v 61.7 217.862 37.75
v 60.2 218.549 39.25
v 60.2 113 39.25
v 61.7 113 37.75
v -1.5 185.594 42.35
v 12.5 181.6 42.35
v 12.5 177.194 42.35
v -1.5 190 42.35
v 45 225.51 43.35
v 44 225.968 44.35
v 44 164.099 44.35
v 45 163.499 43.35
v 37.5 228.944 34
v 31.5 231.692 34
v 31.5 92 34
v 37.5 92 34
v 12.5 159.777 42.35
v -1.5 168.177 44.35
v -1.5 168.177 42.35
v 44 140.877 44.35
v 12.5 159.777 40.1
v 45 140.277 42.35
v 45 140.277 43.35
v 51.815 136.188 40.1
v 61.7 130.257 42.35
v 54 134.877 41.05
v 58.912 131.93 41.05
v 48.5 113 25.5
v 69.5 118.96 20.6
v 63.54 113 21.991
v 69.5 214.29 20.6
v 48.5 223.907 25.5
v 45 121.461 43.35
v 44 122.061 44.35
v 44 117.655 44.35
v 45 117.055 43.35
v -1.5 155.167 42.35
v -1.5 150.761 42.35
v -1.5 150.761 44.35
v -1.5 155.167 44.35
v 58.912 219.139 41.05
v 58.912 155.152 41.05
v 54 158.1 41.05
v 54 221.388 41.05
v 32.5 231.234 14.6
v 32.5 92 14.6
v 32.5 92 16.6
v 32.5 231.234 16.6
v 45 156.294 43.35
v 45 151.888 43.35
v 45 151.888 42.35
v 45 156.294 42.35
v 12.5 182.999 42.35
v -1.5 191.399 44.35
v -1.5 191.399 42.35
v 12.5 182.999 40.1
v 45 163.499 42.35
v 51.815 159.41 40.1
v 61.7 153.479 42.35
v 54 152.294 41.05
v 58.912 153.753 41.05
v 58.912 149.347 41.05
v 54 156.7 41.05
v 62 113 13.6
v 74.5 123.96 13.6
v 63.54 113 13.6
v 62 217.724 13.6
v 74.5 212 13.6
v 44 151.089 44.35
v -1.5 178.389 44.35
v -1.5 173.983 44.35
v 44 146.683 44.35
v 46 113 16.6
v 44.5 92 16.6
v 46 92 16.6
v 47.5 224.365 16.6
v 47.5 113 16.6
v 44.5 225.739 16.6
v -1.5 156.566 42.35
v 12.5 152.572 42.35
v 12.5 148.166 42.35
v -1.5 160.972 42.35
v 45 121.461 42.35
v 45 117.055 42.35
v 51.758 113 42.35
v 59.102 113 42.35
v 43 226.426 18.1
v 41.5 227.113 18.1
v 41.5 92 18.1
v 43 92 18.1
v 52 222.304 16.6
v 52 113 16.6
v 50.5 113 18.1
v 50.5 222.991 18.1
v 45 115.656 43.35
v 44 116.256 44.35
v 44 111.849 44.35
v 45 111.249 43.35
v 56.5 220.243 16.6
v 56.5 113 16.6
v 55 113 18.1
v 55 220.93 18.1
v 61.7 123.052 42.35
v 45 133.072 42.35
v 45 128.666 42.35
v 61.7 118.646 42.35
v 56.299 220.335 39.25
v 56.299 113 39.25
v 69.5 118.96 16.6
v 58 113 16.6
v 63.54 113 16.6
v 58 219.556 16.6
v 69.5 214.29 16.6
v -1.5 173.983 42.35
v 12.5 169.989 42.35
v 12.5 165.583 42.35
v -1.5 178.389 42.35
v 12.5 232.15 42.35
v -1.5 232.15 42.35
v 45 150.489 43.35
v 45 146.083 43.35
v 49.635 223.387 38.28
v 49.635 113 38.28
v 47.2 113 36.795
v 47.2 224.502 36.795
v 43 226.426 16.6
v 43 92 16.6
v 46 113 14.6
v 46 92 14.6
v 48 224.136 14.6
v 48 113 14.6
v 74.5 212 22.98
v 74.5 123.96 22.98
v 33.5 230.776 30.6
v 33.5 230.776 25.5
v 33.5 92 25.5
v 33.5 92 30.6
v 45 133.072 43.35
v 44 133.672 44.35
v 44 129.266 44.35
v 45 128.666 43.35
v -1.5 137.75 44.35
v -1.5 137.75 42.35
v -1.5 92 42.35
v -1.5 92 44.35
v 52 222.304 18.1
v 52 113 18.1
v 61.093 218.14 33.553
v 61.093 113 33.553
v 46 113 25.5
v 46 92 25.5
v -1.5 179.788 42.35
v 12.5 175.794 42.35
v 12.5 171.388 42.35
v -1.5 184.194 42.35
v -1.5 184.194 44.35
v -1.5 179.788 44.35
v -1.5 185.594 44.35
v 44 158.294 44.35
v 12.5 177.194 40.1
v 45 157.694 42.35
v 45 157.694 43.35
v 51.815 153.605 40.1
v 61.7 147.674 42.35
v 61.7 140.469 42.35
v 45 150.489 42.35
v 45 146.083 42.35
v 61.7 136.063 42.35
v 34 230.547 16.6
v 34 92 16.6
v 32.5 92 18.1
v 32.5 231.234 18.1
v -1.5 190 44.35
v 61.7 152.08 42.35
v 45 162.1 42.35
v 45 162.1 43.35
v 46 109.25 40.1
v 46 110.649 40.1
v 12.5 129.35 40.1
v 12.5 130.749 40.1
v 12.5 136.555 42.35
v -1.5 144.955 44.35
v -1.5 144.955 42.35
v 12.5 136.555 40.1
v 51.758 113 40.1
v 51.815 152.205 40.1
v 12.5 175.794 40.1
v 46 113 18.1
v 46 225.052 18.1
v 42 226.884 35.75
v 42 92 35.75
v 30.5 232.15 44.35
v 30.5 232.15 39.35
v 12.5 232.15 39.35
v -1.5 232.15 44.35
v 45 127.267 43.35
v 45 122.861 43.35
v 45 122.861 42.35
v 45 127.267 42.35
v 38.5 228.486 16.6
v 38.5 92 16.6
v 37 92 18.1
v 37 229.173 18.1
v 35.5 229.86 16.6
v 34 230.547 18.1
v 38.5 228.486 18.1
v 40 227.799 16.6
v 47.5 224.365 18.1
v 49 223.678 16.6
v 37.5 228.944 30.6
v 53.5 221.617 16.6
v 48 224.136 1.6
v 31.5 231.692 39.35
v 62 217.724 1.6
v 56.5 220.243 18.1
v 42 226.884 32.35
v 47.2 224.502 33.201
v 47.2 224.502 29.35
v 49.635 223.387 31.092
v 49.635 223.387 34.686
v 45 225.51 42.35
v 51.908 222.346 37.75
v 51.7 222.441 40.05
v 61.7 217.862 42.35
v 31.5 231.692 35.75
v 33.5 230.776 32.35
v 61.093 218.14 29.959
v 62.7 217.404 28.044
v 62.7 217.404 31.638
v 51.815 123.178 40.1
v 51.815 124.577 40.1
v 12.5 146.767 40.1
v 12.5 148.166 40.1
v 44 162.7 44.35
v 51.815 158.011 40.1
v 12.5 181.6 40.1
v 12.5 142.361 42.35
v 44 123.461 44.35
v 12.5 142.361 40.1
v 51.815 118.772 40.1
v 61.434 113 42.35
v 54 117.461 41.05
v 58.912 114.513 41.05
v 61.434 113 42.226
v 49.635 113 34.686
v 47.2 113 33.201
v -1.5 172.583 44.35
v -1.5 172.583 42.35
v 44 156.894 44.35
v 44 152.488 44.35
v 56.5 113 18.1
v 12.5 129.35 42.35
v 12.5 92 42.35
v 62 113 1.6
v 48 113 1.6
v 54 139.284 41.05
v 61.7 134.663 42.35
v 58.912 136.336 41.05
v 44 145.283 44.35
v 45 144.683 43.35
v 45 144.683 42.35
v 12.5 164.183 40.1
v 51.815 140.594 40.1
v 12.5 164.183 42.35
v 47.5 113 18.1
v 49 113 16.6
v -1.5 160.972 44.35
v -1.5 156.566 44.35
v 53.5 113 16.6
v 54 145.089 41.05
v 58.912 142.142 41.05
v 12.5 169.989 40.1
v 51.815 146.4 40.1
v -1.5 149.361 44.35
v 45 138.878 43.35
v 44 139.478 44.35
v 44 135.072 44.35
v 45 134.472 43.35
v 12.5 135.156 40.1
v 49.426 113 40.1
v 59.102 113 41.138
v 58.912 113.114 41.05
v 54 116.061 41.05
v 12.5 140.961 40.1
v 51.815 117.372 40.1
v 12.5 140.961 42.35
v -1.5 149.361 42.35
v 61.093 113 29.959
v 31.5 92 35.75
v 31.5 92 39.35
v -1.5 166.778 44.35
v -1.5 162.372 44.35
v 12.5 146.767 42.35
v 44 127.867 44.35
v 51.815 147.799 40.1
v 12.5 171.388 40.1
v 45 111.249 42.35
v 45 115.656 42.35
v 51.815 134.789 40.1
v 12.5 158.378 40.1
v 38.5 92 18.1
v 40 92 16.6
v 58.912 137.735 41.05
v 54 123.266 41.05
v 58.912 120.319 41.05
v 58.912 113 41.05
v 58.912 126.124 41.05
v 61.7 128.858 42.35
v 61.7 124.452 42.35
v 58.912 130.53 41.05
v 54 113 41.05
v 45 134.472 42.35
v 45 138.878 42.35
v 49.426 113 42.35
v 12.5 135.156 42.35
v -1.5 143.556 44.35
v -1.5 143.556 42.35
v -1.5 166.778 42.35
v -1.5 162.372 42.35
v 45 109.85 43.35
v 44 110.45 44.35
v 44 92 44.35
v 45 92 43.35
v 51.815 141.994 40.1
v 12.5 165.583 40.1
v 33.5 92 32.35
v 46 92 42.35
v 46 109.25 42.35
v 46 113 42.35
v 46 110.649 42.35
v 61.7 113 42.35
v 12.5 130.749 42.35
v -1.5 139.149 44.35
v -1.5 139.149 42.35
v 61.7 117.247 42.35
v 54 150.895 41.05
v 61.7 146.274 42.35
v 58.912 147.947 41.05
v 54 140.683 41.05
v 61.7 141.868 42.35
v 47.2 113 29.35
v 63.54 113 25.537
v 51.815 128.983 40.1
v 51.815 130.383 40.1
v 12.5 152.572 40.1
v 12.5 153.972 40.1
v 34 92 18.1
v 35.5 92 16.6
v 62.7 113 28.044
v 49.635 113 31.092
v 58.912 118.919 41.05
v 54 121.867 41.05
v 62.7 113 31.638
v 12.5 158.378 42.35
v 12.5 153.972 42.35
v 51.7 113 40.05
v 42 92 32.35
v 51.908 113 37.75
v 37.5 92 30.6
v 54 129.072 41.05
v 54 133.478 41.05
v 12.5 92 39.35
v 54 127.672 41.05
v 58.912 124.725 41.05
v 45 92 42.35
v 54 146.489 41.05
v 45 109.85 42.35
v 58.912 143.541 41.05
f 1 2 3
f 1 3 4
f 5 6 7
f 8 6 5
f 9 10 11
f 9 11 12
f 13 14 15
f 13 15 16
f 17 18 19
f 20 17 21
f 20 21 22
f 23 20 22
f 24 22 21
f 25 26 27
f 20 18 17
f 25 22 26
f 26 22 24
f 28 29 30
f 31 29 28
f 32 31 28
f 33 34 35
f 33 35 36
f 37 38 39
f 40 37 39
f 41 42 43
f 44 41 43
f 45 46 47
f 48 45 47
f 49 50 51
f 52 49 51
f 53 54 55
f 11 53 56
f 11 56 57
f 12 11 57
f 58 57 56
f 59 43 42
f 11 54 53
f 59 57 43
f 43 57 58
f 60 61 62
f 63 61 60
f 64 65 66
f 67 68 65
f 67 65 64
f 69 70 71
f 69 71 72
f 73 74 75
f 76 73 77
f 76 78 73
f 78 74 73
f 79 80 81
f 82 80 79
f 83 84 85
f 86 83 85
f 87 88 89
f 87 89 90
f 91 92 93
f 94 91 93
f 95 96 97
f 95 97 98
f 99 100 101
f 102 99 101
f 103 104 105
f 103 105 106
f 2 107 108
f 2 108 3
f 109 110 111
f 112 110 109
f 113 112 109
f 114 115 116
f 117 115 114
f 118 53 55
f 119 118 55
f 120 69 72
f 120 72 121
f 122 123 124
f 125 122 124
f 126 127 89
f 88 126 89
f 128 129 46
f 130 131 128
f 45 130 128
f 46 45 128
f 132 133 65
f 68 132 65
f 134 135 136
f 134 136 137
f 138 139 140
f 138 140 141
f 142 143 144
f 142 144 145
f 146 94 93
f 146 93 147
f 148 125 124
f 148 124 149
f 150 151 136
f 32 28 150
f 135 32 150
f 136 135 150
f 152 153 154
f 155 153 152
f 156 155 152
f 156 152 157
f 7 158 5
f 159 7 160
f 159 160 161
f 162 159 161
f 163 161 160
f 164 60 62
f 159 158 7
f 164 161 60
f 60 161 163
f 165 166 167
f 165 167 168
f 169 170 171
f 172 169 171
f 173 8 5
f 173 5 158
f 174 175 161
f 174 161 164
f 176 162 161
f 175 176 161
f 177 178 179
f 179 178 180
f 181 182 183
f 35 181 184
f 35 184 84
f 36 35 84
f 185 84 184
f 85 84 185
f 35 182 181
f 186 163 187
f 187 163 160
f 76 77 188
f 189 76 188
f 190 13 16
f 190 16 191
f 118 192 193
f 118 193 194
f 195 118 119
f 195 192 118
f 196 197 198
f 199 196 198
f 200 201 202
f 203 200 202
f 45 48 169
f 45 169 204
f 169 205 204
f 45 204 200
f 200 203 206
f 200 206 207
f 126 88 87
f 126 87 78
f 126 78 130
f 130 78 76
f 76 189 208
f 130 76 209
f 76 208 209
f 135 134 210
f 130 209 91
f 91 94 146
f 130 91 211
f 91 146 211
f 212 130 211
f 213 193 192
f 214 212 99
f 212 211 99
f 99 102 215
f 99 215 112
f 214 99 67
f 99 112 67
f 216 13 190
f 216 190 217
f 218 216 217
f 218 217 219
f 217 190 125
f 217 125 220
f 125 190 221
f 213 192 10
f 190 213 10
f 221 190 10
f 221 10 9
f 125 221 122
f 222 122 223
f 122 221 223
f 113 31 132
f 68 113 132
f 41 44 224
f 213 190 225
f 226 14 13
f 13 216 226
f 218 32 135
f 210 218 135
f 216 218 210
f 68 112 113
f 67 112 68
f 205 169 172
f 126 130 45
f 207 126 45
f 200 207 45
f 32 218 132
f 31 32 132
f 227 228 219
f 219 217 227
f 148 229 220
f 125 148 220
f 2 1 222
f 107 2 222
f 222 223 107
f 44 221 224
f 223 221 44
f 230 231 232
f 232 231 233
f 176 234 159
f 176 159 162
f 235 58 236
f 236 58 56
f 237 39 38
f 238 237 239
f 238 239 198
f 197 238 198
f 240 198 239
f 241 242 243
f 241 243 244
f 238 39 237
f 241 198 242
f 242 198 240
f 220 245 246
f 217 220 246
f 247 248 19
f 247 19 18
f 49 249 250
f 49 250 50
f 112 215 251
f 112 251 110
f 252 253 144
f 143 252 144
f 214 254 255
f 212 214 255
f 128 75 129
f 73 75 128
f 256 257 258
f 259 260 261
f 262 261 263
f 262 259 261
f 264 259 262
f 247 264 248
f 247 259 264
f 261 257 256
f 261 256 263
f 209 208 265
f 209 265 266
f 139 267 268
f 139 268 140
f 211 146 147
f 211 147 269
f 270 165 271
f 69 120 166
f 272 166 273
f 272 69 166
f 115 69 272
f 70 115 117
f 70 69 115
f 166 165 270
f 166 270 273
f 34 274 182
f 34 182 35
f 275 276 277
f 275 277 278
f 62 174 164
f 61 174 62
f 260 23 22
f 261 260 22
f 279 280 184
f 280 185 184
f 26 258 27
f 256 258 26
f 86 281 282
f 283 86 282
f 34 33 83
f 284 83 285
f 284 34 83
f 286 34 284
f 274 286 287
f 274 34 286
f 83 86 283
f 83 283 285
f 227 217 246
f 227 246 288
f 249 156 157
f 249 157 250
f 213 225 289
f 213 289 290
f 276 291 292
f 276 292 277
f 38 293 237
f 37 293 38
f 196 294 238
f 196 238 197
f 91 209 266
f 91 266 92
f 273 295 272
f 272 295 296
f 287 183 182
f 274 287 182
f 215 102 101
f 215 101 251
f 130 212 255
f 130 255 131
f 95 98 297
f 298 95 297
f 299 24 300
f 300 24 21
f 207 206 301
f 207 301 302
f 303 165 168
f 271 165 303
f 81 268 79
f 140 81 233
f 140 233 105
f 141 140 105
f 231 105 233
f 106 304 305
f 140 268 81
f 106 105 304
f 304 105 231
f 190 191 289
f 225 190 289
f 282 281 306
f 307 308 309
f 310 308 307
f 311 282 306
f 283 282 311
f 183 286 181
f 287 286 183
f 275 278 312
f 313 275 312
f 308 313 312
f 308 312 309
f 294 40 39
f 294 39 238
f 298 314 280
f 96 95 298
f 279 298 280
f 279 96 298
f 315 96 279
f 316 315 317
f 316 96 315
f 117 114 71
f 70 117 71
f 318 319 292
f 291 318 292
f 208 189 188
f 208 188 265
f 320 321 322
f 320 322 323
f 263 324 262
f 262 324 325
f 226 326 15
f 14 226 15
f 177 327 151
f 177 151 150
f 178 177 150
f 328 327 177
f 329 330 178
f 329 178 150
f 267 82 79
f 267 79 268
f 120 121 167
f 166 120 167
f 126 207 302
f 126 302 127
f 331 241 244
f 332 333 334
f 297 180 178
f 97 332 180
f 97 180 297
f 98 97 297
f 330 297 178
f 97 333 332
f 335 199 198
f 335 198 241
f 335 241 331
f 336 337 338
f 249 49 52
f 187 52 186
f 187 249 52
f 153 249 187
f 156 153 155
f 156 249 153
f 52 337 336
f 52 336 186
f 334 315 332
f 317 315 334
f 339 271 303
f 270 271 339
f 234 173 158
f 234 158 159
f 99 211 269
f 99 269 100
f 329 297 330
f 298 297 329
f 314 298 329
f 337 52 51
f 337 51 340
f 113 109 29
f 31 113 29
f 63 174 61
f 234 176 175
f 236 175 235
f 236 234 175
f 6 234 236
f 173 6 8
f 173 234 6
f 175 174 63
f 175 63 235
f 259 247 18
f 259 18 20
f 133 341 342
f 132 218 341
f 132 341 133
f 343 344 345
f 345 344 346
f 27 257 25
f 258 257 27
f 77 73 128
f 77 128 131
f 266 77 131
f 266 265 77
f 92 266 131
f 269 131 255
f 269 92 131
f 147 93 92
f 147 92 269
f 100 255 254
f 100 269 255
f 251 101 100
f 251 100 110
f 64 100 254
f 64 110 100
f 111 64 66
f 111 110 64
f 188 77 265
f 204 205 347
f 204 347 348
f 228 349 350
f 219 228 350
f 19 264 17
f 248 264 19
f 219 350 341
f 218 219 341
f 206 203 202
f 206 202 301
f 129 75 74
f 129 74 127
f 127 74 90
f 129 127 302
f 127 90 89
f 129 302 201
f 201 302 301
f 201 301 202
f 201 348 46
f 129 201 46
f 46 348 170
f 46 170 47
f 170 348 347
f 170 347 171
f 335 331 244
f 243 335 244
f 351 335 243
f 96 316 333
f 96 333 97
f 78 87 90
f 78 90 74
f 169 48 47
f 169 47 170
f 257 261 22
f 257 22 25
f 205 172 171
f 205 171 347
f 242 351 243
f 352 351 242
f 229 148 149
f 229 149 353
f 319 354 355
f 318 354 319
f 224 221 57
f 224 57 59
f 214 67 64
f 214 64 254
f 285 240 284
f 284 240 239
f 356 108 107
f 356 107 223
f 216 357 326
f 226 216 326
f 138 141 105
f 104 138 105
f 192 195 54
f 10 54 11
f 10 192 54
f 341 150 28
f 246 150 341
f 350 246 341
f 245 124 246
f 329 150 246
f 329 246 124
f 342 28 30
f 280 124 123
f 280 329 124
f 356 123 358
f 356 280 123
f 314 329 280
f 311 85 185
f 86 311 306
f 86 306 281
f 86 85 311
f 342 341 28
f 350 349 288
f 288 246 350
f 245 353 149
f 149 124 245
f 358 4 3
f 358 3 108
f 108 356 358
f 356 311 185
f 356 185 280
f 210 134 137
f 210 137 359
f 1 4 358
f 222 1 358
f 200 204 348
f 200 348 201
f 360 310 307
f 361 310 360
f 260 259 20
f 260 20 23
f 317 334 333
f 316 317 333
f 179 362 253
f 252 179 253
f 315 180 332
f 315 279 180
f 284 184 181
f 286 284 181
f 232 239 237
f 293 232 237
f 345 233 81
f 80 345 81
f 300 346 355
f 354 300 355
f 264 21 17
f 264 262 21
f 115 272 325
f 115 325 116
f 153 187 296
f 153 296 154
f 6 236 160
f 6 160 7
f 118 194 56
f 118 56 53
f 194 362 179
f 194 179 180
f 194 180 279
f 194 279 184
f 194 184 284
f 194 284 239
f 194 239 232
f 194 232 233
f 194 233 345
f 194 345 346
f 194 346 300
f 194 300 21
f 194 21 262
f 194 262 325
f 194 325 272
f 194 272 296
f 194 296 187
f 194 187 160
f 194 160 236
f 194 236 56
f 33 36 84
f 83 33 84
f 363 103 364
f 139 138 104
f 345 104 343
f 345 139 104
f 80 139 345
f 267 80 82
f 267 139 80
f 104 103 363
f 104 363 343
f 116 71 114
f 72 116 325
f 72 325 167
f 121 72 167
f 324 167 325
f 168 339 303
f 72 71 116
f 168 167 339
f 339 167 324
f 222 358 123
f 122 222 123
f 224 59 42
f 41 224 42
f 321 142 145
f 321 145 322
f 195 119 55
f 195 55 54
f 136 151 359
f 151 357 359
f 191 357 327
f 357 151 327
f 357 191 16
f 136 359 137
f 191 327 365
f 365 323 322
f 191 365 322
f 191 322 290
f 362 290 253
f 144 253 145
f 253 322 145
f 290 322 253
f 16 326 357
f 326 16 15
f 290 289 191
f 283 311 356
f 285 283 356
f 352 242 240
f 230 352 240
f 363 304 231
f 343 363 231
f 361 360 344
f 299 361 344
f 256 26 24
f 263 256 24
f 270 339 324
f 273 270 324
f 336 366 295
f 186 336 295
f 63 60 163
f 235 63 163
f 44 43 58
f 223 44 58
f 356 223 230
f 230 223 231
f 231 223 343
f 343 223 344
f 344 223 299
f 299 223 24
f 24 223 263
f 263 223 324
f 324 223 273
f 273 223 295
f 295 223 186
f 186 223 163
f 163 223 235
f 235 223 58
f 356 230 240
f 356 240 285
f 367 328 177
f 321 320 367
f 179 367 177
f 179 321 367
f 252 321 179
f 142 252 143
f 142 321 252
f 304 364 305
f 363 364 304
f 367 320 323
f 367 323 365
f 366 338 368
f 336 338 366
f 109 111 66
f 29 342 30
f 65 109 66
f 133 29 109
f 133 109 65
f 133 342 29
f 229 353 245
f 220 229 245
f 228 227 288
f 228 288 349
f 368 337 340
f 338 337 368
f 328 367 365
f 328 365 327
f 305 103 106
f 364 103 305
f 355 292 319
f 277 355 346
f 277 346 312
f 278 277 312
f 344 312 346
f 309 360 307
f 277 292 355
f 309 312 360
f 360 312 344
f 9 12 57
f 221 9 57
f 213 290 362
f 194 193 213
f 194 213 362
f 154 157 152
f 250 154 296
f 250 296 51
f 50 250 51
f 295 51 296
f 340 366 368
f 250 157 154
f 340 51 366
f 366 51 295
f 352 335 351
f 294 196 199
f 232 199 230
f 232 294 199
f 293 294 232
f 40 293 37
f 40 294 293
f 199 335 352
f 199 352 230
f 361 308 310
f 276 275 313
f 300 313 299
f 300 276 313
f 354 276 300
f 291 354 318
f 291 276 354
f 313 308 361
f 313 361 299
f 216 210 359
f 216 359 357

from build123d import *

# Parameters (mm, degrees)
PAD066_DEPTH        = 140.15
POCKET025_DEPTH     = 42.751
POCKET026_DEPTH     = 4.25
LINEARPATTERN_COUNT = 10
LINEARPATTERN_PITCH = 5.8055555556


with BuildPart() as part:
    # Sketch109 (on DatumPlane) → Pad066 (new body)
    with BuildSketch(Plane.XZ.offset(-232.15)):
        Polygon((-1.5, 44.35), (44, 44.35), (45, 43.35), (45, 42.35), (61.7, 42.35), (58.9121410033, 41.05), (53.9996494638, 41.05), (51.7, 40.05), (53.9996494638, 39.65), (56.2992989276, 39.25), (60.2, 39.25), (61.7, 37.75), (51.907721902, 37.75), (49.6346030244, 38.2803944048), (47.2, 36.794745537), (61.0928843686, 33.5530725177), (62.7, 31.6377866903), (49.6346030244, 34.6863793179), (47.2, 33.2007304502), (61.0928843686, 29.9590574308), (62.7, 28.0437716034), (49.6346030244, 31.0923642311), (47.2, 29.35), (74.5, 22.98), (74.5, 13.6), (62, 13.6), (62, 1.6), (48, 1.6), (48, 14.6), (32.5, 14.6), (32.5, 16.6), (34, 16.6), (32.5, 18.1), (34, 18.1), (35.5, 16.6), (38.5, 16.6), (37, 18.1), (38.5, 18.1), (40, 16.6), (43, 16.6), (41.5, 18.1), (43, 18.1), (44.5, 16.6), (47.5, 16.6), (46, 18.1), (47.5, 18.1), (49, 16.6), (52, 16.6), (50.5, 18.1), (52, 18.1), (53.5, 16.6), (56.5, 16.6), (55, 18.1), (56.5, 18.1), (58, 16.6), (69.5, 16.6), (69.5, 20.6), (48.5, 25.5), (33.5, 25.5), (33.5, 30.6), (37.5, 30.6), (42, 32.35), (33.5, 32.35), (31.5, 34), (37.5, 34), (42, 35.75), (31.5, 35.75), (31.5, 39.35), (12.5, 39.35), (12.5, 42.35), (-1.5, 42.35), align=None)
    extrude(amount=PAD066_DEPTH)

    # Sketch110 (on Face2 of Pad066) → Pocket025 (cut, through all)
    with BuildSketch(Plane(origin=(0, 232.15, 44.35), x_dir=(1, 0, 0), z_dir=(0, 0, 1))):
        Polygon((46, -161.7962), (46, -119.15), (63.5398448916, -119.15), (102.309495165, -80.3803497266), (102.309495165, -161.7962), align=None)
        Polygon((15.2813043199, 6.9694708626), (137.7083776888, -49.0965638734), (137.7083776888, 6.9694708626), align=None)
    extrude(amount=-POCKET025_DEPTH, mode=Mode.SUBTRACT)

    # Sketch111 (on Face2 of Pocket025) → Pocket026 (cut)
    with BuildSketch(Plane(origin=(0, 232.15, 44.35), x_dir=(1, 0, 0), z_dir=(0, 0, 1))):
        Polygon((-49.9825431556, -63.9110456519), (101.4245877181, -154.7553241761), (95.6823064576, -152.7093838745), (-60.3201060514, -59.1079363692), align=None)
    pocket026 = extrude(amount=-POCKET026_DEPTH, mode=Mode.SUBTRACT)

    # LinearPattern: Pocket026 ×10
    with Locations(*[(0, i * LINEARPATTERN_PITCH, 0) for i in range(1, LINEARPATTERN_COUNT)]):
        add(pocket026, mode=Mode.SUBTRACT)


solid = part.part
